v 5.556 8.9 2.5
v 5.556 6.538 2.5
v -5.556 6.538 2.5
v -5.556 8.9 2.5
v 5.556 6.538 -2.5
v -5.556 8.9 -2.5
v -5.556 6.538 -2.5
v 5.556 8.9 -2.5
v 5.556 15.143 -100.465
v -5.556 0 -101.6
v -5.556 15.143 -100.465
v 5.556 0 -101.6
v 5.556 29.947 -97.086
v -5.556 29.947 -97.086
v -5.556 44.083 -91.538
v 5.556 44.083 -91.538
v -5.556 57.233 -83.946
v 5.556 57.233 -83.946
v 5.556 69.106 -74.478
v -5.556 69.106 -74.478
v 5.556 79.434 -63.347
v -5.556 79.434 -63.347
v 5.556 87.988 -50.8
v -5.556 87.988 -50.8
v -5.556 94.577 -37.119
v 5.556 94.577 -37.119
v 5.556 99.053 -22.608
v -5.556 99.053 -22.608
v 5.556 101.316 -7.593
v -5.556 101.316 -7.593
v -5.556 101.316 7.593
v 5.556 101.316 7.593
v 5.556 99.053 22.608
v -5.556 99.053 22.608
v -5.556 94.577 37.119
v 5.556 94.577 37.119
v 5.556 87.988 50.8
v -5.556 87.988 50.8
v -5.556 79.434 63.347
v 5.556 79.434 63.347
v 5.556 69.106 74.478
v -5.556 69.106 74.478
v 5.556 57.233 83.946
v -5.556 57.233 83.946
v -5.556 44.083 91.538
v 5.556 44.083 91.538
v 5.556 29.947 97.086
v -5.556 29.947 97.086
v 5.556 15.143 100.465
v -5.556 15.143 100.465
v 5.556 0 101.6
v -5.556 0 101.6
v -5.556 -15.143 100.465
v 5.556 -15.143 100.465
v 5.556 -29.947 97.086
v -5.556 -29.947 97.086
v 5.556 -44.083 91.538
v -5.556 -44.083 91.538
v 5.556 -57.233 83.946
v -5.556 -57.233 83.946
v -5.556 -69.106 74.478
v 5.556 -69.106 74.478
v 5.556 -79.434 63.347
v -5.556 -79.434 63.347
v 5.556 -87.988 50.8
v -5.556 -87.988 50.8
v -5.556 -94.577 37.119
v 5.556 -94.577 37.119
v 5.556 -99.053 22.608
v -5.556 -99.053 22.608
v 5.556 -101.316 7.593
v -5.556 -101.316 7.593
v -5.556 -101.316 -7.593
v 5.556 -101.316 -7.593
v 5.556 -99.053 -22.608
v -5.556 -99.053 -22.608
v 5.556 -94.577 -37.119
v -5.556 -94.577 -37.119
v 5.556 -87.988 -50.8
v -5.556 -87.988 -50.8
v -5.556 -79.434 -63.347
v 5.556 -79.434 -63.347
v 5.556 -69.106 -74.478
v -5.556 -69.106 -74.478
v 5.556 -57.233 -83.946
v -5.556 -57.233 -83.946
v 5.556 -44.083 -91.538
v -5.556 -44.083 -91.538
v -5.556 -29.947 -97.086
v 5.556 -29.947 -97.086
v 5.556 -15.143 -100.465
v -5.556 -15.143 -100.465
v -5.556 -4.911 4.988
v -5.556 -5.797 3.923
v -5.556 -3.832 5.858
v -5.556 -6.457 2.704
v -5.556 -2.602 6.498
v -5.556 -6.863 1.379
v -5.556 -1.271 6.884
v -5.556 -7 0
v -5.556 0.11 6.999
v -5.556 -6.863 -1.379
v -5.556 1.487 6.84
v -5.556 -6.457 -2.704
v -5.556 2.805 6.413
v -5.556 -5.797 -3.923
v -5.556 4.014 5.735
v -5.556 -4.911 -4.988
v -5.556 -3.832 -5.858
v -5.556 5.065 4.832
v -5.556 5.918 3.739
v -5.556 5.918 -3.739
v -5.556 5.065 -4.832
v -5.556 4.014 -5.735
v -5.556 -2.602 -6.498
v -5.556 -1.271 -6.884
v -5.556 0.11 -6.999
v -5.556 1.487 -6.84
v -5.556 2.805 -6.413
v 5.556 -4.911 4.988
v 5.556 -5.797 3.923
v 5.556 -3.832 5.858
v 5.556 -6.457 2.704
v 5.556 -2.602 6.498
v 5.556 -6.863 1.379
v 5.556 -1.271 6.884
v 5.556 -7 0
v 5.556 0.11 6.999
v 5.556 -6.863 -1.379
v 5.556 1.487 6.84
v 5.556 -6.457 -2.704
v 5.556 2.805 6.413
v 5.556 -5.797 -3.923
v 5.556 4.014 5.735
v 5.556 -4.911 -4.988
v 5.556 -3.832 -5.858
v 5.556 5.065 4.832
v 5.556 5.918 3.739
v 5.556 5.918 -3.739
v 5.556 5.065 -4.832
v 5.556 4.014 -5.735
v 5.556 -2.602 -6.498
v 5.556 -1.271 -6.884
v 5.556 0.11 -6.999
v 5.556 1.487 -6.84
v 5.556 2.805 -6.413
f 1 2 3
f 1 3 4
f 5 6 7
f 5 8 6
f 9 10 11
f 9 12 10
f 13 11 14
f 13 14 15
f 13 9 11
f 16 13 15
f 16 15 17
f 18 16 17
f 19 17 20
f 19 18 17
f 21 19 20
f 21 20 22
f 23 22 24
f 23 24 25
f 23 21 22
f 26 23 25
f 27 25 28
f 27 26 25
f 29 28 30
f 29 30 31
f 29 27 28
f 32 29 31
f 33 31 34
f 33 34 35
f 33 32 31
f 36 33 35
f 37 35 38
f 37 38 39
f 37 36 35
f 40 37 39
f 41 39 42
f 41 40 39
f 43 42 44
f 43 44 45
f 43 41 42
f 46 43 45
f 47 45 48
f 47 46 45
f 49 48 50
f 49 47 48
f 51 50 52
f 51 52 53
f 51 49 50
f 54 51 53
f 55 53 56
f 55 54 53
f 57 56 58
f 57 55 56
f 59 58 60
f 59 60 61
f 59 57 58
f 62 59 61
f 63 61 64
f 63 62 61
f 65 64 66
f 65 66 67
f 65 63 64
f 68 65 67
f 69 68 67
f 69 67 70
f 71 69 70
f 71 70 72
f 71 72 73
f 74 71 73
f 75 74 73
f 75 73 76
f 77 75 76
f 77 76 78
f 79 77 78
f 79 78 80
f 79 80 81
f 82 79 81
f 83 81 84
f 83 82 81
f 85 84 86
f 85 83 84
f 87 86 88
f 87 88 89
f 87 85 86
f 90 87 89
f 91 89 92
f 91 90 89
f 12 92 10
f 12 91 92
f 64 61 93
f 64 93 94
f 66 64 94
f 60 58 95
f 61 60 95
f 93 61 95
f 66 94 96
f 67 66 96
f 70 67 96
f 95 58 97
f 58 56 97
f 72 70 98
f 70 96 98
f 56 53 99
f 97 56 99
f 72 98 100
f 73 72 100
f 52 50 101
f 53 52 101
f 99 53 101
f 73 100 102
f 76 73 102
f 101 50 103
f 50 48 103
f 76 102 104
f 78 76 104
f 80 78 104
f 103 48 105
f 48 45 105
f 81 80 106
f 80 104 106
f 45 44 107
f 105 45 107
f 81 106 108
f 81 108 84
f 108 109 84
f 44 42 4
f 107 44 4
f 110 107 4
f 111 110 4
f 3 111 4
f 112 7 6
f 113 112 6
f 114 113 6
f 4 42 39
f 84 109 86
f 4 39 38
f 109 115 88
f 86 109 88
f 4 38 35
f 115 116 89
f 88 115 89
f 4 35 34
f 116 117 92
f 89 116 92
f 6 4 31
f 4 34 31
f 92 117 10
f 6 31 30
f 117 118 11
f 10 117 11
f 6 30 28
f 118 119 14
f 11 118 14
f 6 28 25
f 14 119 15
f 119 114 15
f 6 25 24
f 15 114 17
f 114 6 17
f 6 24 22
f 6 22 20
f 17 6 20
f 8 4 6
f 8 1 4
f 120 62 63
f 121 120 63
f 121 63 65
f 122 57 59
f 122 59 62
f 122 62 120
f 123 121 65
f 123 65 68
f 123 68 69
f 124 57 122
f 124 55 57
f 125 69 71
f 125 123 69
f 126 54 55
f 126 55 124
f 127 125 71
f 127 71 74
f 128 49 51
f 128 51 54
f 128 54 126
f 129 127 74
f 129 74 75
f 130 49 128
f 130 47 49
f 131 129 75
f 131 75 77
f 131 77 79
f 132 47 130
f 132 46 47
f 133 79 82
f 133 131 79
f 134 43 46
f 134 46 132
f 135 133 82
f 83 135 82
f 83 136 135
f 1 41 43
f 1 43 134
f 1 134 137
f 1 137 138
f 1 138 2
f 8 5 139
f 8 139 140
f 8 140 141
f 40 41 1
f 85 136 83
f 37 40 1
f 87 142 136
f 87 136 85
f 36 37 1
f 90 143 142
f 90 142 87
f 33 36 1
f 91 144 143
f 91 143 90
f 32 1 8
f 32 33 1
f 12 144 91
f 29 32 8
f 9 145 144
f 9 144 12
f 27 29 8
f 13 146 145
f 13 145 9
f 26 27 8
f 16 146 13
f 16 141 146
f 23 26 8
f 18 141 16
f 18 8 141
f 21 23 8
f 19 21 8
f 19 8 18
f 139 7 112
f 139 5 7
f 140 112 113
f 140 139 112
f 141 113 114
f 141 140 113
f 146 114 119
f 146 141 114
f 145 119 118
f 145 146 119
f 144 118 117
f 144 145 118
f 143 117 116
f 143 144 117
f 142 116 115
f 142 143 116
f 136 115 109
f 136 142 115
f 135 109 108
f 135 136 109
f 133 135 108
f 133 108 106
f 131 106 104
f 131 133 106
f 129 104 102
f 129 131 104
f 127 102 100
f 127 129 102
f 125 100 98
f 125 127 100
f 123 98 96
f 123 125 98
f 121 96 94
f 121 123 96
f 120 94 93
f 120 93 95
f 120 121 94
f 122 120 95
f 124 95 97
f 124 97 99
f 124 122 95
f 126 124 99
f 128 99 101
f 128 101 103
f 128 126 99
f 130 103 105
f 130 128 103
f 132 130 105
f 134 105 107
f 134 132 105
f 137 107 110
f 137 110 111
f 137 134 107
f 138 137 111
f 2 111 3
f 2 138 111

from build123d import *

# Parameters (mm, degrees)
SKETCH1_R           = 101.6
BOSS_EXTRUDE1_DEPTH = 5.55625


with BuildPart() as part:
    # Sketch1 → Boss-Extrude1 (new, symmetric)
    with BuildSketch(Plane(origin=(0, 0, 0), x_dir=(0, 0, -1), z_dir=(1, 0, 0))):
        Circle(SKETCH1_R)
        with BuildLine():
            Line((-2.5, 6.538348415), (-2.5, 8.9))
            Line((-2.5, 8.9), (2.5, 8.9))
            Line((2.5, 8.9), (2.5, 6.538348415))
            ThreePointArc((2.5, 6.538348415), (0, -7), (-2.5, 6.538348415))
        make_face(mode=Mode.SUBTRACT)
    extrude(amount=BOSS_EXTRUDE1_DEPTH, both=True)


solid = part.part
